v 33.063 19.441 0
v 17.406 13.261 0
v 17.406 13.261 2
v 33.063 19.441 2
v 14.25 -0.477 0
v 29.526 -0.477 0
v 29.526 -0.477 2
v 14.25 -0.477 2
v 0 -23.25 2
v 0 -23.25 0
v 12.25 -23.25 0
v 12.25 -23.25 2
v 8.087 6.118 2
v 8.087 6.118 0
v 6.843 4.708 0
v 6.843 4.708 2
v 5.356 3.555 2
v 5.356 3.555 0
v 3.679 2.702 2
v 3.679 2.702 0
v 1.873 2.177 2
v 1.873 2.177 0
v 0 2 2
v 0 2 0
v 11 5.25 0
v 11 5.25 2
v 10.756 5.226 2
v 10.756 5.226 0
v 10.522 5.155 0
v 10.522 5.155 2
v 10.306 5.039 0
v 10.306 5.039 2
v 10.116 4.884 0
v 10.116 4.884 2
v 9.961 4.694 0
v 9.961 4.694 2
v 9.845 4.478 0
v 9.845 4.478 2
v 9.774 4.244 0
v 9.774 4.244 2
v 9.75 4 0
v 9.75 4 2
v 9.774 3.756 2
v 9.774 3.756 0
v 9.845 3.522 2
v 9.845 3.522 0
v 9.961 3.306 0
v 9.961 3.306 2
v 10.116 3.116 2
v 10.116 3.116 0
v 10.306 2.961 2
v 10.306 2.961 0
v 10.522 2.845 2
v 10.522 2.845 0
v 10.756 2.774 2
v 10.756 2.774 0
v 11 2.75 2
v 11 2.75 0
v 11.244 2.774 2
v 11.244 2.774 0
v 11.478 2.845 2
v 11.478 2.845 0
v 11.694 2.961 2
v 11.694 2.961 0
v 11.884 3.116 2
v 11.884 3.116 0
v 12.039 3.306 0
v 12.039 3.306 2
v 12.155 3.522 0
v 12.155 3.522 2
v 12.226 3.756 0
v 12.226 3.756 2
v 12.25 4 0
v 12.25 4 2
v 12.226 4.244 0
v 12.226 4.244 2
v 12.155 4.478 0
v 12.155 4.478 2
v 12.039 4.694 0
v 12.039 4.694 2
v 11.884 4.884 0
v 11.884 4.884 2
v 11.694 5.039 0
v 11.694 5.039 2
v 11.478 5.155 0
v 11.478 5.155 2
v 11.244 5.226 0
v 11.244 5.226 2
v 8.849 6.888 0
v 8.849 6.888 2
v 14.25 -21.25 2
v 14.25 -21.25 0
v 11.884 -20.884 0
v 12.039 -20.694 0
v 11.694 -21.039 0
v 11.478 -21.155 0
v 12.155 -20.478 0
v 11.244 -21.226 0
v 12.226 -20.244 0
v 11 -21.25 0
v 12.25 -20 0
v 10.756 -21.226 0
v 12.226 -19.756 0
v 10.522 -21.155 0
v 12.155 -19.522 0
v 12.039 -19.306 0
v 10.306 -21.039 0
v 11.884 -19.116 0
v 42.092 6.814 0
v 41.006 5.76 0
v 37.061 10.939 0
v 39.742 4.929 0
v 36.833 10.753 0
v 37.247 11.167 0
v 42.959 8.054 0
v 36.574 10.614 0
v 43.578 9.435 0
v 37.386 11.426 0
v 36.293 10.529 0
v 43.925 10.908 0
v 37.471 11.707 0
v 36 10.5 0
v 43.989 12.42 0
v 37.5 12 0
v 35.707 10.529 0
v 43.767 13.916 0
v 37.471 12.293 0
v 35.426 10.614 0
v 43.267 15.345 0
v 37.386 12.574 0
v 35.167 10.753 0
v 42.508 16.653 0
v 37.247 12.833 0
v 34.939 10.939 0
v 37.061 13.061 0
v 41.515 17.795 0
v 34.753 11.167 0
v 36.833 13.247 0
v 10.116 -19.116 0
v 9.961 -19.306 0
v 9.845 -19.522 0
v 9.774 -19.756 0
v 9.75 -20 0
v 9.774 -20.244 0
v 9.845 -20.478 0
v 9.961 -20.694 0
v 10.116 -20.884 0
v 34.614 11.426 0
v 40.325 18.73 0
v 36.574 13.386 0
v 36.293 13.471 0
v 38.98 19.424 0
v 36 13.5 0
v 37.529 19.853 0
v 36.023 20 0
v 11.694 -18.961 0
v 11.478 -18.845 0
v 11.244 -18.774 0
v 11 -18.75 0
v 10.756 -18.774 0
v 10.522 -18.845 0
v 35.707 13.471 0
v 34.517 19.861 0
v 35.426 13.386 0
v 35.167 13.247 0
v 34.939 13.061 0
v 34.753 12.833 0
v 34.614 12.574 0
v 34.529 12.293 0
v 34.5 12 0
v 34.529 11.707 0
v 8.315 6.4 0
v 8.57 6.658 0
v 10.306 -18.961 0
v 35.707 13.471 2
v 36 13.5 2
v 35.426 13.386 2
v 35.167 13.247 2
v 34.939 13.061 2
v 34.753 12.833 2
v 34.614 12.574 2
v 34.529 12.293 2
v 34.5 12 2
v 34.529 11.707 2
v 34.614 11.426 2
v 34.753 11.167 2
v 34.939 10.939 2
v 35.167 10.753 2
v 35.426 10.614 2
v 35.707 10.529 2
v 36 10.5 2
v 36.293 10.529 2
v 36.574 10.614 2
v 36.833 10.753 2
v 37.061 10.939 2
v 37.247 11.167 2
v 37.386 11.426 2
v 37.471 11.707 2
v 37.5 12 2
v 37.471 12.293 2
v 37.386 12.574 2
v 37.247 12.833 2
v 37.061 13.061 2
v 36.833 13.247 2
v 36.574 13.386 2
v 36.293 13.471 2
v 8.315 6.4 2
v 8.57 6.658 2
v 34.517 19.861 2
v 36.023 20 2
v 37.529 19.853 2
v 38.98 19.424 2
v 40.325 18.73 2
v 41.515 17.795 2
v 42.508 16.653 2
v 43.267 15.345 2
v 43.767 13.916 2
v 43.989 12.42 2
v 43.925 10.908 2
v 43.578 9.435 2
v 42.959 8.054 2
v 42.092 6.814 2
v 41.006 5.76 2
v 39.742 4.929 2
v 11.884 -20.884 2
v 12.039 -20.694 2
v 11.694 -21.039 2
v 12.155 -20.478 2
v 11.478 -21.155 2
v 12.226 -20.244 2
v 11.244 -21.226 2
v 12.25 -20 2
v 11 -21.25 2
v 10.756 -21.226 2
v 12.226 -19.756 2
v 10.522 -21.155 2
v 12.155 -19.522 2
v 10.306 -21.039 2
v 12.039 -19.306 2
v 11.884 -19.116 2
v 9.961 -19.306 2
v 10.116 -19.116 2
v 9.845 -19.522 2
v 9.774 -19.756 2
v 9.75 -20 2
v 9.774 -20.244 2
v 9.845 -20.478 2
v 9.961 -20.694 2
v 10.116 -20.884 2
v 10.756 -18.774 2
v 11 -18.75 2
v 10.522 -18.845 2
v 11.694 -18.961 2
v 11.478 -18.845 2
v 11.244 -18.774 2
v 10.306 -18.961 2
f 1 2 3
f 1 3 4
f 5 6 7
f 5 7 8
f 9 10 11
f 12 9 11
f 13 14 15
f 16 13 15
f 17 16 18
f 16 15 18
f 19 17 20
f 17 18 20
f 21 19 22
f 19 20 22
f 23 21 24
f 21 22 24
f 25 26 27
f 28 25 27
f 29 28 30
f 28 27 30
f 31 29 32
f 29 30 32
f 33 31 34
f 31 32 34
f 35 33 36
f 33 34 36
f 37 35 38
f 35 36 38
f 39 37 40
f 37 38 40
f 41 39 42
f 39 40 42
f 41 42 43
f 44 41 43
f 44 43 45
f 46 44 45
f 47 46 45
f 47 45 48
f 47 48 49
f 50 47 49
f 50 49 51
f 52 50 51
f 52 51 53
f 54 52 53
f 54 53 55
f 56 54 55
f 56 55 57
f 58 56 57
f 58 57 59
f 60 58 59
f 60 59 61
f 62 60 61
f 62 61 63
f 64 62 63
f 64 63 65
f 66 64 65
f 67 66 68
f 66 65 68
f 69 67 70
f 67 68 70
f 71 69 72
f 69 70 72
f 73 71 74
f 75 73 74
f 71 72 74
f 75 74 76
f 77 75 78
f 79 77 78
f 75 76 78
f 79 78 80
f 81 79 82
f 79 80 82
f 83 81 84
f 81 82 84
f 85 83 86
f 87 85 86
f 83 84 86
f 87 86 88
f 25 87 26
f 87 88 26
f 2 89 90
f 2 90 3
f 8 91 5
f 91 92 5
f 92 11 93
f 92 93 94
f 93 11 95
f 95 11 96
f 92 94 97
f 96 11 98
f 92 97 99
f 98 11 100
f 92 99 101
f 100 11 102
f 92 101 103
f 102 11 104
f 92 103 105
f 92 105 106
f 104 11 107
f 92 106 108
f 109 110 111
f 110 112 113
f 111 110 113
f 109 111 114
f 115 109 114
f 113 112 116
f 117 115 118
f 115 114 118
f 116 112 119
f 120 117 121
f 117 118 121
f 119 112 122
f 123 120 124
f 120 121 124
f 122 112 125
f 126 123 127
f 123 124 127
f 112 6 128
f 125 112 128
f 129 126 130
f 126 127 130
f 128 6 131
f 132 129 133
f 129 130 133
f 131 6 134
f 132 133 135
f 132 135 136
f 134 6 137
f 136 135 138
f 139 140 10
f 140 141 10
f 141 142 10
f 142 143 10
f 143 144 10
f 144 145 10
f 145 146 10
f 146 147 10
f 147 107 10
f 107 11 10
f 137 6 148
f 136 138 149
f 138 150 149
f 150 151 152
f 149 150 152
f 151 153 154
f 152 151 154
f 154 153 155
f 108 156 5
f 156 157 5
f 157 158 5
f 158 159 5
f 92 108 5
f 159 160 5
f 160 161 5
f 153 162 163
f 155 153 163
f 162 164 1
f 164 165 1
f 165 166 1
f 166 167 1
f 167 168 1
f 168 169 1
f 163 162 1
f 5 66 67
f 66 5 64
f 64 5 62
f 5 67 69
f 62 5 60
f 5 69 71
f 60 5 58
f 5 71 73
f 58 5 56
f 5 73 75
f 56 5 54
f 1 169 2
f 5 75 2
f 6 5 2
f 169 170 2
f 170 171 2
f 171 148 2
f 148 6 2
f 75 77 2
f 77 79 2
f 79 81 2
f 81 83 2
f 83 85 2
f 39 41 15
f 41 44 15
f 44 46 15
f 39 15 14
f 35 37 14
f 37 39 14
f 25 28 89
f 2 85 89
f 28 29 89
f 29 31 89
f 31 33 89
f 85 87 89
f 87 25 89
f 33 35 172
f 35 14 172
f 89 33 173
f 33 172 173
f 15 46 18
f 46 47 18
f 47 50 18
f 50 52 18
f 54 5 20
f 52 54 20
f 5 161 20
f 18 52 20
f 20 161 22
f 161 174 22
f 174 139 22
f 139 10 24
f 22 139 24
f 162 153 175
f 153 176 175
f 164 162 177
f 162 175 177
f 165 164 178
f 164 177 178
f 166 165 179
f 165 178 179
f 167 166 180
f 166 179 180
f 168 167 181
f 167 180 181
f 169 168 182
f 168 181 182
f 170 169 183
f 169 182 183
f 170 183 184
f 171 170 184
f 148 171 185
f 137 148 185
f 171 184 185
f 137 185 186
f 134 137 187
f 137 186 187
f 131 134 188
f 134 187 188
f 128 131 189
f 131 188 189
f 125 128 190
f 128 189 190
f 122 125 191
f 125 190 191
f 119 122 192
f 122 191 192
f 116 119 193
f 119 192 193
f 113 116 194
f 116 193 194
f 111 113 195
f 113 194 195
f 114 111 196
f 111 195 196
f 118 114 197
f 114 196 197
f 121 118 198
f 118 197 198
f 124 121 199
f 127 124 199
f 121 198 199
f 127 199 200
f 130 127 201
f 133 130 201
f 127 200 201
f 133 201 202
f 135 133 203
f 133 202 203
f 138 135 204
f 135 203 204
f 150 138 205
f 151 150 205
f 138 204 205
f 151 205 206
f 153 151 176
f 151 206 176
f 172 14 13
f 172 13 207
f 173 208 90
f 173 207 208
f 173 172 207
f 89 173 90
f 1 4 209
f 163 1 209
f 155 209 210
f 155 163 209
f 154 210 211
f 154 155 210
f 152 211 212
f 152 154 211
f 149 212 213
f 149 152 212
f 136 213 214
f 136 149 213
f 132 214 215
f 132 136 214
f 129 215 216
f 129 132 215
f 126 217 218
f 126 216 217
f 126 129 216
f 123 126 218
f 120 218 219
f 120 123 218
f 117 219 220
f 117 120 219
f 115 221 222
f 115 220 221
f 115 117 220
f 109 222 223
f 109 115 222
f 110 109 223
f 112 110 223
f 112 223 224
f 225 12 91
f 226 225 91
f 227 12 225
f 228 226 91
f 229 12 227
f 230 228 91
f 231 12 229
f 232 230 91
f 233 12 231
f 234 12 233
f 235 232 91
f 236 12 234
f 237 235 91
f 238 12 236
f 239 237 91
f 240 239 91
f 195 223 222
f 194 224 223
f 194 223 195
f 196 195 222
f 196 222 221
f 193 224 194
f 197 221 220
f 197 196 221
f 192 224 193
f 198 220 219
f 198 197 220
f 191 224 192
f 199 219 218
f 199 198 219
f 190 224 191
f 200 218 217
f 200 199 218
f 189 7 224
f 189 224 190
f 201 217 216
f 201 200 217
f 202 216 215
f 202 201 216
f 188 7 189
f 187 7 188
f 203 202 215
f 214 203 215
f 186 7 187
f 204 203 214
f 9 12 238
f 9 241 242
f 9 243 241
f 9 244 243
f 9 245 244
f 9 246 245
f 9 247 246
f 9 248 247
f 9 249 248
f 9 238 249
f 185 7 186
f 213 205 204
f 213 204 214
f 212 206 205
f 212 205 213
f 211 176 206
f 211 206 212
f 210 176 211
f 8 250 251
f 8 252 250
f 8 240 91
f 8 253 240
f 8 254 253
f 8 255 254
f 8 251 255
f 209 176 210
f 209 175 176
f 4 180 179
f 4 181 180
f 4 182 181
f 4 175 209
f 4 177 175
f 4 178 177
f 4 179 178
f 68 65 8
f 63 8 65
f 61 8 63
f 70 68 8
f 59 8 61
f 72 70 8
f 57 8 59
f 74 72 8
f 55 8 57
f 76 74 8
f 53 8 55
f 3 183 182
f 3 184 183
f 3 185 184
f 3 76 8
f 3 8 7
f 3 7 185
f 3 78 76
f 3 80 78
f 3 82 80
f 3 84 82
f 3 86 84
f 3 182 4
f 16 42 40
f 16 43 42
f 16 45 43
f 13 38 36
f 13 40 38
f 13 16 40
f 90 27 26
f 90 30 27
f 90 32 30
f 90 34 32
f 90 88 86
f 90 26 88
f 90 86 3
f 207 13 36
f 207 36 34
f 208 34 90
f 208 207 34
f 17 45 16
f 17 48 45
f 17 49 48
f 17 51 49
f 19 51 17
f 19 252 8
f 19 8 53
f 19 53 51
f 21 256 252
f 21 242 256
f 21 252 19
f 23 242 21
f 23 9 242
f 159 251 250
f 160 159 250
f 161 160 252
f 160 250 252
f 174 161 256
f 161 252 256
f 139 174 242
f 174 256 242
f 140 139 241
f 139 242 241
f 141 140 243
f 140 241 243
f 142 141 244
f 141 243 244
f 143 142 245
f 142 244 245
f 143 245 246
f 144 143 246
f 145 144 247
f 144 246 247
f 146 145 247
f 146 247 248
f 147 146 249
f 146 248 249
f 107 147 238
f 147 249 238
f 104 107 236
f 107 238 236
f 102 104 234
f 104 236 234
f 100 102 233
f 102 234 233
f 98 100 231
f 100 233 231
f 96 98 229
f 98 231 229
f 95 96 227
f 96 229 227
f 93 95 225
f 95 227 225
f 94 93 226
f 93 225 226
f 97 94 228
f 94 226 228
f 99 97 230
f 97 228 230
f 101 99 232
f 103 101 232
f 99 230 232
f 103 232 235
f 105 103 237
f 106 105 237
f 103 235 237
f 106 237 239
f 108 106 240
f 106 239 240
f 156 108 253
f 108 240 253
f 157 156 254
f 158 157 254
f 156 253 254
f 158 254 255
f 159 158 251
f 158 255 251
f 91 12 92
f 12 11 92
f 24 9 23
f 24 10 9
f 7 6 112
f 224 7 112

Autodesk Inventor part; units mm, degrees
ref_plane "YZ Plane" through (0, 0, 0) normal (1, 0, 0) x (0, 1, 0)
ref_plane "XZ Plane" through (0, 0, 0) normal (0, 1, 0) x (-1, 0, 0)
ref_plane "XY Plane" through (0, 0, 0) normal (0, 0, 1) x (1, 0, 0)
sketch "スケッチ1" plane through (0, 0, 0) normal (0, 0, 1) x (0, 1, 0)
  circle A0 centre (12, 0) radius 4 construction
  arc A1 (2, 0) -> (6.1183, -8.0874) centre (12, 0) ccw
  arc A2 (6.8885, -8.8489) -> (6.1183, -8.0874) centre (4, -11) ccw
  line L0 (-23.25, 12.25) -> (-23.25, -12.25) construction
  line L1 (-23.25, -12.25) -> (-21.25, -14.25) construction
  line L2 (-21.25, -14.25) -> (21.25, -14.25) construction
  line L3 (0, 0) -> (2, 0)
  line L4 (0, 0) -> (-23.25, 0)
  line L5 (-23.25, 0) -> (-23.25, -12.25)
  line L6 (-23.25, -12.25) -> (-21.25, -14.25)
  line L7 (-0.4772, -29.5258) -> (4.929, -39.7419)
  line L8 (6.8885, -8.8489) -> (13.2614, -17.4062)
  line L9 (13.2614, -17.4062) -> (19.4413, -33.0628)
  line L10 (2, 0) -> (12, 0) construction
  circle A3 centre (4, -11) radius 1.25 construction
  arc A4 (4.929, -39.7419) -> (19.4413, -33.0628) centre (12, -36) ccw
  circle A5 centre (-20, -11) radius 1.25 construction
  line L11 (12, 0) -> (12, -36) construction
  line L12 (-21.25, -14.25) -> (-0.4772, -14.25)
  line L13 (-0.4772, -29.5258) -> (-0.4772, -14.25)
  dimension "d0" = 10
  dimension "d3" = 36
  dimension "d4" = 8
extrude "押し出し1" add sketch "スケッチ1" along normal blind 2
hole "穴1" at (36, 12, 0) direction (0, 0, 1) diameter 3 end through all
hole "穴2" at (11, 4, 0) at (11, -20, 0) direction (0, 0, 1) diameter 2.5 end through all
properties part number "HIP_TOPFRAME2"
